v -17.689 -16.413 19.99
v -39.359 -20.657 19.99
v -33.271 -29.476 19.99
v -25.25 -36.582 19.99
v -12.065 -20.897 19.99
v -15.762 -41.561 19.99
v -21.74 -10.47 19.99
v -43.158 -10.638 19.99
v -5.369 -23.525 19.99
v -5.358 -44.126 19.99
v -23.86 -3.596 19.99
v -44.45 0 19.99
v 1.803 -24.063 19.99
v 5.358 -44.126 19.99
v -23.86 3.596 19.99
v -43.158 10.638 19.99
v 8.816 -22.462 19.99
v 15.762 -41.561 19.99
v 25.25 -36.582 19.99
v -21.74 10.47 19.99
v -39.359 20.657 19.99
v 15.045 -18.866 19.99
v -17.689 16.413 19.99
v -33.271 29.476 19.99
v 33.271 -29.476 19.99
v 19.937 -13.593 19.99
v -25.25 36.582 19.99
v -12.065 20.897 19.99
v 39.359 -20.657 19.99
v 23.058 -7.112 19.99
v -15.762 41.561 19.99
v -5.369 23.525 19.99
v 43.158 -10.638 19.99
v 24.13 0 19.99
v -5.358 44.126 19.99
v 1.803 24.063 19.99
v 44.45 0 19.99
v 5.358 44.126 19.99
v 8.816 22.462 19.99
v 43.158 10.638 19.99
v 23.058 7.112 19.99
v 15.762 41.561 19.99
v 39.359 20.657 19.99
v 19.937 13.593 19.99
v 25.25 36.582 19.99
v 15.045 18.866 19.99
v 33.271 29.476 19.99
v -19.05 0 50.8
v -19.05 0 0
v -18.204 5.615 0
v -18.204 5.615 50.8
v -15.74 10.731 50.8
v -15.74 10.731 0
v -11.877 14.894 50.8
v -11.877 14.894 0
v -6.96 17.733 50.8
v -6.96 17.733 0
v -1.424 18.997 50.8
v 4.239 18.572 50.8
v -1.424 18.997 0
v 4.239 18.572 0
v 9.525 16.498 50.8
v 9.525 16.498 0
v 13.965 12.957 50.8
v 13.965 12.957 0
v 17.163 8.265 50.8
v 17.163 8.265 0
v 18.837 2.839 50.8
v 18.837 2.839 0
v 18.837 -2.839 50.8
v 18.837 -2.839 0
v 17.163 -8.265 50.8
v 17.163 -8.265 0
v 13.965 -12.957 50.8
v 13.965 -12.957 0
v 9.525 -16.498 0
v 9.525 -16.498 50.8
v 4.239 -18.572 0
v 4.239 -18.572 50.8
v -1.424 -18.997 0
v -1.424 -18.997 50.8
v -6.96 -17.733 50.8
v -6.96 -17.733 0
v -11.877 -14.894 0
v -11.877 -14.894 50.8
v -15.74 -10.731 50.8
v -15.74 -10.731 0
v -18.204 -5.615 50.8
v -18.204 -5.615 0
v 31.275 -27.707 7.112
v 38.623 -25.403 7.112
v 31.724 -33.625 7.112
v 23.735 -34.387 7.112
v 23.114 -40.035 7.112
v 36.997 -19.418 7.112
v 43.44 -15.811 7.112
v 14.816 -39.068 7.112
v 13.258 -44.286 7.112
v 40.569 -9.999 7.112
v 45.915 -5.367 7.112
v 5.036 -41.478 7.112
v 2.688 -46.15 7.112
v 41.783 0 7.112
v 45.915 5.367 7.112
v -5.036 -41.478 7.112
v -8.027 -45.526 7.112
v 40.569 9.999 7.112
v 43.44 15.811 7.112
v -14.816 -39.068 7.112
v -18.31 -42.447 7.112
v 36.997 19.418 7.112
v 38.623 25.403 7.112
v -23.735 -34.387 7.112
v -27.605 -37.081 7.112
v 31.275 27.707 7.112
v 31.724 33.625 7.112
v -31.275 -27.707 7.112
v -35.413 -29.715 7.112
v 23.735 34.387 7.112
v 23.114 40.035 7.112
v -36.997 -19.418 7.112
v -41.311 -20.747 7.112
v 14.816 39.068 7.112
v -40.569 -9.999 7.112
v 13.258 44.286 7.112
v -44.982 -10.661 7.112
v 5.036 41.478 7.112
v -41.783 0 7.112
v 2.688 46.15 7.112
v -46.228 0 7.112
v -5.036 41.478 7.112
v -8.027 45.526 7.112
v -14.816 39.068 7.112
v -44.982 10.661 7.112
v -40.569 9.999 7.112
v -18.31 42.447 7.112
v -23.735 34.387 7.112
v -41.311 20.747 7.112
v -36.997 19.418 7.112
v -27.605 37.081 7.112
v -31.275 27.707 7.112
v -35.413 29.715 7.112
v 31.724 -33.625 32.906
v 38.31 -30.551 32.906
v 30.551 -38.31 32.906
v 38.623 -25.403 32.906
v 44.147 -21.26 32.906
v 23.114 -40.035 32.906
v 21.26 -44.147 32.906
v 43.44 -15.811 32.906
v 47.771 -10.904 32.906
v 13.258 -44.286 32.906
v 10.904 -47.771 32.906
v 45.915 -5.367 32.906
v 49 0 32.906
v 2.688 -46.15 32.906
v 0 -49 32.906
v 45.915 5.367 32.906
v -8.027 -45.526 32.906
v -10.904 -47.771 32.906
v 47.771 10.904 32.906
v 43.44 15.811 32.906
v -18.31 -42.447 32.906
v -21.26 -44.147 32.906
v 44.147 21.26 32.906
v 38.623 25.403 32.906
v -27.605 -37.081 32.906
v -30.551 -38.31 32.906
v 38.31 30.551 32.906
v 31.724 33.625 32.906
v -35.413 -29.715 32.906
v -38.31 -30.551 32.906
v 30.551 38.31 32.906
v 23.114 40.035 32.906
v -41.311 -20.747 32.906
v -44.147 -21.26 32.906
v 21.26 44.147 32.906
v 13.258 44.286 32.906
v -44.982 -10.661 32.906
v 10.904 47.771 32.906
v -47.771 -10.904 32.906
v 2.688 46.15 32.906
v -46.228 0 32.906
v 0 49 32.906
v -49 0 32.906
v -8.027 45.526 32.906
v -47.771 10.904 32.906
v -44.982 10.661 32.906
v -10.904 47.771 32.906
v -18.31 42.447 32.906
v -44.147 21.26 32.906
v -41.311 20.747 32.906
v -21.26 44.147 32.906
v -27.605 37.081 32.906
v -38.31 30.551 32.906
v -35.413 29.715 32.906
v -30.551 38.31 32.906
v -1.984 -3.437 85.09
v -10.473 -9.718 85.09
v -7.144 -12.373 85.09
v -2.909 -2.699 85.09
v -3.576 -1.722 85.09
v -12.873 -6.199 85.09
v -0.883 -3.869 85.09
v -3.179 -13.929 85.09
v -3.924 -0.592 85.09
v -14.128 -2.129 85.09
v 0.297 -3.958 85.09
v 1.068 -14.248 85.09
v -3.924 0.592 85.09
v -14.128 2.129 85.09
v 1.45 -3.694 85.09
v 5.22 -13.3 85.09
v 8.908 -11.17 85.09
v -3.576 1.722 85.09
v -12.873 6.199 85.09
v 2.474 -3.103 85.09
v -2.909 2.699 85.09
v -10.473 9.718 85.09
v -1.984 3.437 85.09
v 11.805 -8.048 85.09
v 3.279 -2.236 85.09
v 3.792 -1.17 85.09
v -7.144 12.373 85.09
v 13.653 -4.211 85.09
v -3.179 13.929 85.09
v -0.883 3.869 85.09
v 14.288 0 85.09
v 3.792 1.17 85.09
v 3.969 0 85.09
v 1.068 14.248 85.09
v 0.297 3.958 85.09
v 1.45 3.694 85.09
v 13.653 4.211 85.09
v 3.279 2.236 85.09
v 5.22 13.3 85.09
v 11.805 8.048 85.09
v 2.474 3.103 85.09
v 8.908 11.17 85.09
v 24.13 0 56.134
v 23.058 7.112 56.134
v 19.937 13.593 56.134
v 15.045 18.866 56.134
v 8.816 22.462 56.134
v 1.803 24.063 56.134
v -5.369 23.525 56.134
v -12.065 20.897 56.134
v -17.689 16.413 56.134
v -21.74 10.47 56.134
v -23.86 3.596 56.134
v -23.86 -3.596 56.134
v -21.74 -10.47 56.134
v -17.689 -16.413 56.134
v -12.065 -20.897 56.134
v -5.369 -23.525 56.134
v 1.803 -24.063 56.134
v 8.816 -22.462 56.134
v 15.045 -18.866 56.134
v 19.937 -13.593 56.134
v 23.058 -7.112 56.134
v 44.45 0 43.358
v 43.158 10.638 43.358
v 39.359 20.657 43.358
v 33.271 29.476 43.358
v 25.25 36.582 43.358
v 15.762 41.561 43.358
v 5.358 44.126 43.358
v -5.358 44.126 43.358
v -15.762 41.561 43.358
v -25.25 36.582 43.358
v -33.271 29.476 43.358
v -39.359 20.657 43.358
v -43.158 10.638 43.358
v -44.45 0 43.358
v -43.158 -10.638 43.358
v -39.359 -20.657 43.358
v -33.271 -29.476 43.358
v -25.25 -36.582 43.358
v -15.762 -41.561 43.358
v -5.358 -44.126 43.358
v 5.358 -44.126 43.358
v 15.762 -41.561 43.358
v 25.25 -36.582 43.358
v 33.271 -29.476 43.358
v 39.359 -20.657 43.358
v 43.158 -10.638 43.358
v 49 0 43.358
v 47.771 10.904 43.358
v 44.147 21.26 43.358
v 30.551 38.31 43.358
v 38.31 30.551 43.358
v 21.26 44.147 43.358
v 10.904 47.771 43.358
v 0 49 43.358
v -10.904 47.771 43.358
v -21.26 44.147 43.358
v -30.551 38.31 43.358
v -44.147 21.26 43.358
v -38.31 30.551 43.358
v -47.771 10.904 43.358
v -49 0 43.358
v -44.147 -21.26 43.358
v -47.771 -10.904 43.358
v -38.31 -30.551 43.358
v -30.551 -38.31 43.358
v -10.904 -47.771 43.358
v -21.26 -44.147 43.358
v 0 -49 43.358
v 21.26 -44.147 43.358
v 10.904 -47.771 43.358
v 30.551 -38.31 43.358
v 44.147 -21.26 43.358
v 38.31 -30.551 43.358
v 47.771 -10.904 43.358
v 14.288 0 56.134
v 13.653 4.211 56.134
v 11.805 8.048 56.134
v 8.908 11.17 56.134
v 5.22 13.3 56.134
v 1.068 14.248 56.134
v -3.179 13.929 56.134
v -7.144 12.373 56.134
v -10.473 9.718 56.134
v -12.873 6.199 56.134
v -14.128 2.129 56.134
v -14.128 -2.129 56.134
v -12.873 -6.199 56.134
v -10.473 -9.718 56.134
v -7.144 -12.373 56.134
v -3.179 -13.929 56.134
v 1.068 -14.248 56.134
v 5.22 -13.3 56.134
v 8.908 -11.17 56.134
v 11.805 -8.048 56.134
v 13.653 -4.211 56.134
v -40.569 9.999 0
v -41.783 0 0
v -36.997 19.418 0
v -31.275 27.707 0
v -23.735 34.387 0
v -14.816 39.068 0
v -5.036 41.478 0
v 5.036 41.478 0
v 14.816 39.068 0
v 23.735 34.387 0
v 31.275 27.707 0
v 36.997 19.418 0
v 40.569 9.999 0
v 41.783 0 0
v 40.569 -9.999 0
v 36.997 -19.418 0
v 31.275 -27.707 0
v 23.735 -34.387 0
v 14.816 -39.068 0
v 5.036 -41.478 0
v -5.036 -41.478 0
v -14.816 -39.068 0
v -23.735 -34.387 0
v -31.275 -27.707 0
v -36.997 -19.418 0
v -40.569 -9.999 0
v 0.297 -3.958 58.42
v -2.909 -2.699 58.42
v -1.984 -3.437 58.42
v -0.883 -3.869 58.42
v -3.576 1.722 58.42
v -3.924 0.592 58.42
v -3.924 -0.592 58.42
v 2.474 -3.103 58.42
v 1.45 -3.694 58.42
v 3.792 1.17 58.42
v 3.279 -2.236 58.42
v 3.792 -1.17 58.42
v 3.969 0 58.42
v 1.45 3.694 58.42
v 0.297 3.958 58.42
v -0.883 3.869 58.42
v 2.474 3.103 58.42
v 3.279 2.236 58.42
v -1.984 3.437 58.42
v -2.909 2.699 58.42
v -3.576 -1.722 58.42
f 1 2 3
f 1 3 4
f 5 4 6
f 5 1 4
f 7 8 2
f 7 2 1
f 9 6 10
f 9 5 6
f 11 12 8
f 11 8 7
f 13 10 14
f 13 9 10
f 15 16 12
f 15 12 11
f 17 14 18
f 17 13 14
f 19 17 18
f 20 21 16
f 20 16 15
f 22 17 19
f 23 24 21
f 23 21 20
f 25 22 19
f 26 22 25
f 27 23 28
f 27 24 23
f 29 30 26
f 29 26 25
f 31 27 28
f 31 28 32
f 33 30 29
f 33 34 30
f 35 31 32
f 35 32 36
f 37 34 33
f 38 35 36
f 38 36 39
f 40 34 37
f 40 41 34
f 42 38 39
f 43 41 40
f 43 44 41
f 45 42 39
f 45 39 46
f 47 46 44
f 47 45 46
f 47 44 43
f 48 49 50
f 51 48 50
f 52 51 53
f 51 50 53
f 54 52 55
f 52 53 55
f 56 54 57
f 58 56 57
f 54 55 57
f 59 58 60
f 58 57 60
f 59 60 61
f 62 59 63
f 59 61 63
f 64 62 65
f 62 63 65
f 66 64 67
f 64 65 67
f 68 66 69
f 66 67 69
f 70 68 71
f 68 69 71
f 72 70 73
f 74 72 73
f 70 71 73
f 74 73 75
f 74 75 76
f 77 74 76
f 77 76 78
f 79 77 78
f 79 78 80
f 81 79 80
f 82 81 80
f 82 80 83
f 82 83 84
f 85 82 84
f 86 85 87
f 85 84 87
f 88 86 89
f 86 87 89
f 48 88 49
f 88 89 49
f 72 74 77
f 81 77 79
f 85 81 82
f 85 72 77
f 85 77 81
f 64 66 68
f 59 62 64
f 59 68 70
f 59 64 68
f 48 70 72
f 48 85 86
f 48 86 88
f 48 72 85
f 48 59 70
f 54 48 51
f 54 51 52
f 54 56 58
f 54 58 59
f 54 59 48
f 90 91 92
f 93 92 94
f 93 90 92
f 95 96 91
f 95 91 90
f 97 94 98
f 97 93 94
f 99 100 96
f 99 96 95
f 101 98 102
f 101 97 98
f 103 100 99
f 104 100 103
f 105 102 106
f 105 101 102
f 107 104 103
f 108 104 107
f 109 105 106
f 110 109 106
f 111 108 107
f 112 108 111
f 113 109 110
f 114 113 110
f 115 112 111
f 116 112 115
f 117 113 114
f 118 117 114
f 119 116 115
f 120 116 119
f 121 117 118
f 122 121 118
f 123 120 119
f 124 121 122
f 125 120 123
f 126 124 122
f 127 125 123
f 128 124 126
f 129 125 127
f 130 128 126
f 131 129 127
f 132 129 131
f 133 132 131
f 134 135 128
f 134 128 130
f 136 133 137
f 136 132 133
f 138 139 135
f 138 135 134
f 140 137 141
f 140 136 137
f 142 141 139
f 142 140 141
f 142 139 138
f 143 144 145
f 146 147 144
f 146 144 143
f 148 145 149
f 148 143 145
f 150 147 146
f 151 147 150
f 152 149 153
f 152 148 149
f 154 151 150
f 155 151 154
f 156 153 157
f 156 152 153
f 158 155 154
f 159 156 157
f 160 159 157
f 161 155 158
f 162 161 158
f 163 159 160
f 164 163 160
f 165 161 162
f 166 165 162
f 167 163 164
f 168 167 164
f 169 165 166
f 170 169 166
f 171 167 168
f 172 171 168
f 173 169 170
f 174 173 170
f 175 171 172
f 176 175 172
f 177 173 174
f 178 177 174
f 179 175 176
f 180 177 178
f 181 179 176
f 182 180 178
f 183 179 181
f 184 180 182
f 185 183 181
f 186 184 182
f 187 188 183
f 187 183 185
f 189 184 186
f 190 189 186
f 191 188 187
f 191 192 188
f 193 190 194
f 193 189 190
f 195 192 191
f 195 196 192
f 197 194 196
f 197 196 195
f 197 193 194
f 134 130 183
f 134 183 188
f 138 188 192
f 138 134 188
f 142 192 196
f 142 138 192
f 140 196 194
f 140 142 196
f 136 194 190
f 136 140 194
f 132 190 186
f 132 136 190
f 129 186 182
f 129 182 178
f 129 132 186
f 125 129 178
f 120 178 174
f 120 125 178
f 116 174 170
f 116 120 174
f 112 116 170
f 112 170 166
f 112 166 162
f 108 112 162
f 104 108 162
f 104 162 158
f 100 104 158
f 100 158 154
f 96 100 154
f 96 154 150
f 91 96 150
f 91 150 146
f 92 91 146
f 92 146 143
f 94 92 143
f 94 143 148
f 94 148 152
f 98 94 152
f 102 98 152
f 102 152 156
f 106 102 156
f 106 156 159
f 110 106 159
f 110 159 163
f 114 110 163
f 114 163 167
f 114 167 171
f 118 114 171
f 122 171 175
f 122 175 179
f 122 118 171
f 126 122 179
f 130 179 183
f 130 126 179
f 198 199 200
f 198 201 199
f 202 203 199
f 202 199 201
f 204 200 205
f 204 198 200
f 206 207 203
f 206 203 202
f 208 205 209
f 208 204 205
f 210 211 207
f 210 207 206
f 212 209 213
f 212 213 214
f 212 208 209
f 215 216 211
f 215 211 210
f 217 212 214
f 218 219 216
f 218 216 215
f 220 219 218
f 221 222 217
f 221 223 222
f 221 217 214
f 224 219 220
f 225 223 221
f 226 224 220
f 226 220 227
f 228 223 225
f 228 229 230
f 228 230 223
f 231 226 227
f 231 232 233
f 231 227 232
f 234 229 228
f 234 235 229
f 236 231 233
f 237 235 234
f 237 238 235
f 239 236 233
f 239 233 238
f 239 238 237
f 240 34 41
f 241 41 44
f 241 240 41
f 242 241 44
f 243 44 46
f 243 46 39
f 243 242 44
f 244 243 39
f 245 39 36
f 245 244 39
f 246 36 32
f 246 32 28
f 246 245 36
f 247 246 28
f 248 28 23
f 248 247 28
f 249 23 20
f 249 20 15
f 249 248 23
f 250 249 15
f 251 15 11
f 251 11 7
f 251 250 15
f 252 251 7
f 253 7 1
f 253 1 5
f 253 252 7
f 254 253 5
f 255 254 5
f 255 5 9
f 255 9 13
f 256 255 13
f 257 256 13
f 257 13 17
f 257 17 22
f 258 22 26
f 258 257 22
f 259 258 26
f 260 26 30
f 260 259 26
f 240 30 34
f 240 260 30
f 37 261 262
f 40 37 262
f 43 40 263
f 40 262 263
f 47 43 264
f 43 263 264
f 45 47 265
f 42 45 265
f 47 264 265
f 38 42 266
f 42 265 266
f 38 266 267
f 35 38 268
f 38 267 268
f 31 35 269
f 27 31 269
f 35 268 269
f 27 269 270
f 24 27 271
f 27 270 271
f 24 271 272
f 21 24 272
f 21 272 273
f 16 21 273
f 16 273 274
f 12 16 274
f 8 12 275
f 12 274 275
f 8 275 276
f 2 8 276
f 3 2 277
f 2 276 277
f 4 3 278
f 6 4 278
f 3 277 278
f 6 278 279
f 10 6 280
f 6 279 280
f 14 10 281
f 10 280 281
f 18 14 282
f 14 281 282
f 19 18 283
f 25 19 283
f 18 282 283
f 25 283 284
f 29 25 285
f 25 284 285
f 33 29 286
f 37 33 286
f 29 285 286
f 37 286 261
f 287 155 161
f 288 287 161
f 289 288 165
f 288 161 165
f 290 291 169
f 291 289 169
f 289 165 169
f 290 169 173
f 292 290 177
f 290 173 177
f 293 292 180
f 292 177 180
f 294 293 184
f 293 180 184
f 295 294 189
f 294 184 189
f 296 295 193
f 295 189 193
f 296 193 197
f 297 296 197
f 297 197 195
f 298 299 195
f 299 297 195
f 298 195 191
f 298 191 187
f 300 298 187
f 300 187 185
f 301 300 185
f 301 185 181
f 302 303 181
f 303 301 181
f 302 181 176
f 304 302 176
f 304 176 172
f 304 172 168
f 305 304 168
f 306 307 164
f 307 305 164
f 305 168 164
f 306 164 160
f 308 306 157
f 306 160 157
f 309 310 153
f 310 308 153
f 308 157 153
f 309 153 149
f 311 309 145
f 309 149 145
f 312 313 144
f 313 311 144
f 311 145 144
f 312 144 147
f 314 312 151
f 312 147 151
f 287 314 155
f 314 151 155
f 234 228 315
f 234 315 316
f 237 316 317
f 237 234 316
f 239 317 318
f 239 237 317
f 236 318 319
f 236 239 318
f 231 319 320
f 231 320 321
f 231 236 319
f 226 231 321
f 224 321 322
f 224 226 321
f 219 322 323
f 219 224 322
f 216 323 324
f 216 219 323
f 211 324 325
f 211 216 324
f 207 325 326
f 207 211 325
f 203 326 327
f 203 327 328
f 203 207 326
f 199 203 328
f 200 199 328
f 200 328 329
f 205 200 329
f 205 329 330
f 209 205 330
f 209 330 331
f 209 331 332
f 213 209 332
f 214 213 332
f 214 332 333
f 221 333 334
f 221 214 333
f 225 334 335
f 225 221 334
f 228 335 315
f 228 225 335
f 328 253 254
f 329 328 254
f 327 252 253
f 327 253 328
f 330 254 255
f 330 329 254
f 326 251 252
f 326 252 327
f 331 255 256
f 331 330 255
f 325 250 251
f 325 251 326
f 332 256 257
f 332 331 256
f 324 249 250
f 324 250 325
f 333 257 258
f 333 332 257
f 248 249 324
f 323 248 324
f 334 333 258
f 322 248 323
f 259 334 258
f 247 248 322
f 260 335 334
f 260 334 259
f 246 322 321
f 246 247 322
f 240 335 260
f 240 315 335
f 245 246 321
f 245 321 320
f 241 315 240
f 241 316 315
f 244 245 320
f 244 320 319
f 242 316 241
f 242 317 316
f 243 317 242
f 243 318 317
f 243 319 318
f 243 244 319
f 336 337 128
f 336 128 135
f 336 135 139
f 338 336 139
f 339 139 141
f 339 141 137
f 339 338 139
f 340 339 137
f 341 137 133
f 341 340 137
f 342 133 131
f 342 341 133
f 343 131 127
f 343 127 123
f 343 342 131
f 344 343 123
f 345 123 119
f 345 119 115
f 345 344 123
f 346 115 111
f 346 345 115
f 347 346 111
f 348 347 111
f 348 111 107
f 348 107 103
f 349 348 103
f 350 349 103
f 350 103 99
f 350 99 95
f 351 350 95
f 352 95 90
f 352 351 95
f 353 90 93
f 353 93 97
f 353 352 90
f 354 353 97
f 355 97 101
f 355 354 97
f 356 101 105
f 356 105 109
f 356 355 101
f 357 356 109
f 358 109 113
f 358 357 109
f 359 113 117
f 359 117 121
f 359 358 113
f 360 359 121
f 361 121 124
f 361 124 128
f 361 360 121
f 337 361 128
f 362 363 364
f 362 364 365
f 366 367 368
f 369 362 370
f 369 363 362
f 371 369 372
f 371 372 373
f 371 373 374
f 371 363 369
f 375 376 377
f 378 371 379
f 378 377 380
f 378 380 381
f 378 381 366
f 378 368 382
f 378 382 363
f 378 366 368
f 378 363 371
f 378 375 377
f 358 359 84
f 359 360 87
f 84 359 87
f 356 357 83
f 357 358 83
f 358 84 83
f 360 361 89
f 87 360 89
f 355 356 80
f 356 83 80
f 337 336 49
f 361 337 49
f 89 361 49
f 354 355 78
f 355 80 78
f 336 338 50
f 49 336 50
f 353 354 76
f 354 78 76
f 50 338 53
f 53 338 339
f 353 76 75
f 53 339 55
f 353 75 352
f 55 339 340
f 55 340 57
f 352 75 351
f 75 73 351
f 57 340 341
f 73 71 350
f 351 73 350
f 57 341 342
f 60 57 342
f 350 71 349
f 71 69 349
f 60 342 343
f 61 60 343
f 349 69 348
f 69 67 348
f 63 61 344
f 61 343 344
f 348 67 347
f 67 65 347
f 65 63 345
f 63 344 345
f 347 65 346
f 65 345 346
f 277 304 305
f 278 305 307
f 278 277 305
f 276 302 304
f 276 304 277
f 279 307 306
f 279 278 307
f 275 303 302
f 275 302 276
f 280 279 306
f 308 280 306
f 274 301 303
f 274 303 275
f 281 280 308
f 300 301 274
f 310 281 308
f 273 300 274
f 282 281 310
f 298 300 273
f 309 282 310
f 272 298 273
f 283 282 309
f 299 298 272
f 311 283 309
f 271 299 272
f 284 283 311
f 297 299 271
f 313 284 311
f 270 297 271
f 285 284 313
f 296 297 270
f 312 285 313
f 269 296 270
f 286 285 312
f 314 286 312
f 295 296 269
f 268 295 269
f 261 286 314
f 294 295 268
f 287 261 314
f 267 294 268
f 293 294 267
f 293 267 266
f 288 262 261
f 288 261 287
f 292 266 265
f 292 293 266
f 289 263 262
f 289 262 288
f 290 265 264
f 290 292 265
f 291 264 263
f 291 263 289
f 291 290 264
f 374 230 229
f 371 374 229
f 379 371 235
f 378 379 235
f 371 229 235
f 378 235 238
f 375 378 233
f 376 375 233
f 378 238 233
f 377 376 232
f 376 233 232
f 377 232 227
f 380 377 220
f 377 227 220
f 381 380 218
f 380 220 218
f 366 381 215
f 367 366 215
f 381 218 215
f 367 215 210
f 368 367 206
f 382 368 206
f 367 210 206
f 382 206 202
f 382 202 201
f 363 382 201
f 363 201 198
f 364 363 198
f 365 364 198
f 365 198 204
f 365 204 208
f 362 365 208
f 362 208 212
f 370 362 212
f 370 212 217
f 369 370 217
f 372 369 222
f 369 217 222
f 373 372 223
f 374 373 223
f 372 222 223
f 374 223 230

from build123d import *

# Parameters (mm, degrees)
SKETCH1_R         = 49
EXTRUDE1_DEPTH    = 85.09
SKETCH5_R         = 3.96875
EXTRUDE5_DEPTH    = 26.67
SKETCH2_OUTSIDE_W = 132.526
SKETCH2_OUTSIDE_H = 132.526
SKETCH2_OUTSIDE_R = 14.2875
EXTRUDE2_DEPTH    = 28.956
SKETCH3_OUTSIDE_W = 132.526
SKETCH3_OUTSIDE_H = 132.526
SKETCH3_OUTSIDE_R = 24.13
EXTRUDE3_DEPTH    = 12.7762
SKETCH4_OUTSIDE_W = 132.526
SKETCH4_OUTSIDE_H = 132.526
SKETCH4_OUTSIDE_R = 46.228
EXTRUDE4_DEPTH    = 32.9057
SKETCH6_R         = 44.45
SKETCH6_R_2       = 24.13
EXTRUDE8_DEPTH    = 23.368
SKETCH7_R         = 19.05
EXTRUDE9_DEPTH    = 50.8
SKETCH8_OUTSIDE_W = 132.526
SKETCH8_OUTSIDE_H = 132.526
SKETCH8_OUTSIDE_R = 41.783
EXTRUDE10_DEPTH   = 7.112


with BuildPart() as part:
    # Sketch1 → Extrude1 (new body)
    with BuildSketch(Plane.XY):
        Circle(SKETCH1_R)
    extrude(amount=EXTRUDE1_DEPTH)

    # Sketch5 → Extrude5 (cut)
    with BuildSketch(Plane.XY.offset(85.09)):
        Circle(SKETCH5_R)
    extrude(amount=-EXTRUDE5_DEPTH, mode=Mode.SUBTRACT)

    # Sketch2 outside → Extrude2 (cut)
    with BuildSketch(Plane.XY.offset(85.09)):
        Rectangle(SKETCH2_OUTSIDE_W, SKETCH2_OUTSIDE_H)
        Circle(SKETCH2_OUTSIDE_R, mode=Mode.SUBTRACT)
    extrude(amount=-EXTRUDE2_DEPTH, mode=Mode.SUBTRACT)

    # Sketch3 outside → Extrude3 (cut)
    with BuildSketch(Plane.XY.offset(56.134)):
        Rectangle(SKETCH3_OUTSIDE_W, SKETCH3_OUTSIDE_H)
        Circle(SKETCH3_OUTSIDE_R, mode=Mode.SUBTRACT)
    extrude(amount=-EXTRUDE3_DEPTH, mode=Mode.SUBTRACT)

    # Sketch4 outside → Extrude4 (cut)
    with BuildSketch(Plane(origin=(0, 0, 0), x_dir=(-1, 0, 0), z_dir=(0, 0, -1))):
        Rectangle(SKETCH4_OUTSIDE_W, SKETCH4_OUTSIDE_H)
        Circle(SKETCH4_OUTSIDE_R, mode=Mode.SUBTRACT)
    extrude(amount=-EXTRUDE4_DEPTH, mode=Mode.SUBTRACT)

    # Sketch6 → Extrude8 (cut)
    with BuildSketch(Plane.XY.offset(43.3578)):
        Circle(SKETCH6_R)
        Circle(SKETCH6_R_2, mode=Mode.SUBTRACT)
    extrude(amount=-EXTRUDE8_DEPTH, mode=Mode.SUBTRACT)

    # Sketch7 → Extrude9 (cut)
    with BuildSketch(Plane(origin=(0, 0, 0), x_dir=(-1, 0, 0), z_dir=(0, 0, -1))):
        Circle(SKETCH7_R)
    extrude(amount=-EXTRUDE9_DEPTH, mode=Mode.SUBTRACT)

    # Sketch8 outside → Extrude10 (cut)
    with BuildSketch(Plane(origin=(0, 0, 0), x_dir=(-1, 0, 0), z_dir=(0, 0, -1))):
        Rectangle(SKETCH8_OUTSIDE_W, SKETCH8_OUTSIDE_H)
        Circle(SKETCH8_OUTSIDE_R, mode=Mode.SUBTRACT)
    extrude(amount=-EXTRUDE10_DEPTH, mode=Mode.SUBTRACT)


solid = part.part
